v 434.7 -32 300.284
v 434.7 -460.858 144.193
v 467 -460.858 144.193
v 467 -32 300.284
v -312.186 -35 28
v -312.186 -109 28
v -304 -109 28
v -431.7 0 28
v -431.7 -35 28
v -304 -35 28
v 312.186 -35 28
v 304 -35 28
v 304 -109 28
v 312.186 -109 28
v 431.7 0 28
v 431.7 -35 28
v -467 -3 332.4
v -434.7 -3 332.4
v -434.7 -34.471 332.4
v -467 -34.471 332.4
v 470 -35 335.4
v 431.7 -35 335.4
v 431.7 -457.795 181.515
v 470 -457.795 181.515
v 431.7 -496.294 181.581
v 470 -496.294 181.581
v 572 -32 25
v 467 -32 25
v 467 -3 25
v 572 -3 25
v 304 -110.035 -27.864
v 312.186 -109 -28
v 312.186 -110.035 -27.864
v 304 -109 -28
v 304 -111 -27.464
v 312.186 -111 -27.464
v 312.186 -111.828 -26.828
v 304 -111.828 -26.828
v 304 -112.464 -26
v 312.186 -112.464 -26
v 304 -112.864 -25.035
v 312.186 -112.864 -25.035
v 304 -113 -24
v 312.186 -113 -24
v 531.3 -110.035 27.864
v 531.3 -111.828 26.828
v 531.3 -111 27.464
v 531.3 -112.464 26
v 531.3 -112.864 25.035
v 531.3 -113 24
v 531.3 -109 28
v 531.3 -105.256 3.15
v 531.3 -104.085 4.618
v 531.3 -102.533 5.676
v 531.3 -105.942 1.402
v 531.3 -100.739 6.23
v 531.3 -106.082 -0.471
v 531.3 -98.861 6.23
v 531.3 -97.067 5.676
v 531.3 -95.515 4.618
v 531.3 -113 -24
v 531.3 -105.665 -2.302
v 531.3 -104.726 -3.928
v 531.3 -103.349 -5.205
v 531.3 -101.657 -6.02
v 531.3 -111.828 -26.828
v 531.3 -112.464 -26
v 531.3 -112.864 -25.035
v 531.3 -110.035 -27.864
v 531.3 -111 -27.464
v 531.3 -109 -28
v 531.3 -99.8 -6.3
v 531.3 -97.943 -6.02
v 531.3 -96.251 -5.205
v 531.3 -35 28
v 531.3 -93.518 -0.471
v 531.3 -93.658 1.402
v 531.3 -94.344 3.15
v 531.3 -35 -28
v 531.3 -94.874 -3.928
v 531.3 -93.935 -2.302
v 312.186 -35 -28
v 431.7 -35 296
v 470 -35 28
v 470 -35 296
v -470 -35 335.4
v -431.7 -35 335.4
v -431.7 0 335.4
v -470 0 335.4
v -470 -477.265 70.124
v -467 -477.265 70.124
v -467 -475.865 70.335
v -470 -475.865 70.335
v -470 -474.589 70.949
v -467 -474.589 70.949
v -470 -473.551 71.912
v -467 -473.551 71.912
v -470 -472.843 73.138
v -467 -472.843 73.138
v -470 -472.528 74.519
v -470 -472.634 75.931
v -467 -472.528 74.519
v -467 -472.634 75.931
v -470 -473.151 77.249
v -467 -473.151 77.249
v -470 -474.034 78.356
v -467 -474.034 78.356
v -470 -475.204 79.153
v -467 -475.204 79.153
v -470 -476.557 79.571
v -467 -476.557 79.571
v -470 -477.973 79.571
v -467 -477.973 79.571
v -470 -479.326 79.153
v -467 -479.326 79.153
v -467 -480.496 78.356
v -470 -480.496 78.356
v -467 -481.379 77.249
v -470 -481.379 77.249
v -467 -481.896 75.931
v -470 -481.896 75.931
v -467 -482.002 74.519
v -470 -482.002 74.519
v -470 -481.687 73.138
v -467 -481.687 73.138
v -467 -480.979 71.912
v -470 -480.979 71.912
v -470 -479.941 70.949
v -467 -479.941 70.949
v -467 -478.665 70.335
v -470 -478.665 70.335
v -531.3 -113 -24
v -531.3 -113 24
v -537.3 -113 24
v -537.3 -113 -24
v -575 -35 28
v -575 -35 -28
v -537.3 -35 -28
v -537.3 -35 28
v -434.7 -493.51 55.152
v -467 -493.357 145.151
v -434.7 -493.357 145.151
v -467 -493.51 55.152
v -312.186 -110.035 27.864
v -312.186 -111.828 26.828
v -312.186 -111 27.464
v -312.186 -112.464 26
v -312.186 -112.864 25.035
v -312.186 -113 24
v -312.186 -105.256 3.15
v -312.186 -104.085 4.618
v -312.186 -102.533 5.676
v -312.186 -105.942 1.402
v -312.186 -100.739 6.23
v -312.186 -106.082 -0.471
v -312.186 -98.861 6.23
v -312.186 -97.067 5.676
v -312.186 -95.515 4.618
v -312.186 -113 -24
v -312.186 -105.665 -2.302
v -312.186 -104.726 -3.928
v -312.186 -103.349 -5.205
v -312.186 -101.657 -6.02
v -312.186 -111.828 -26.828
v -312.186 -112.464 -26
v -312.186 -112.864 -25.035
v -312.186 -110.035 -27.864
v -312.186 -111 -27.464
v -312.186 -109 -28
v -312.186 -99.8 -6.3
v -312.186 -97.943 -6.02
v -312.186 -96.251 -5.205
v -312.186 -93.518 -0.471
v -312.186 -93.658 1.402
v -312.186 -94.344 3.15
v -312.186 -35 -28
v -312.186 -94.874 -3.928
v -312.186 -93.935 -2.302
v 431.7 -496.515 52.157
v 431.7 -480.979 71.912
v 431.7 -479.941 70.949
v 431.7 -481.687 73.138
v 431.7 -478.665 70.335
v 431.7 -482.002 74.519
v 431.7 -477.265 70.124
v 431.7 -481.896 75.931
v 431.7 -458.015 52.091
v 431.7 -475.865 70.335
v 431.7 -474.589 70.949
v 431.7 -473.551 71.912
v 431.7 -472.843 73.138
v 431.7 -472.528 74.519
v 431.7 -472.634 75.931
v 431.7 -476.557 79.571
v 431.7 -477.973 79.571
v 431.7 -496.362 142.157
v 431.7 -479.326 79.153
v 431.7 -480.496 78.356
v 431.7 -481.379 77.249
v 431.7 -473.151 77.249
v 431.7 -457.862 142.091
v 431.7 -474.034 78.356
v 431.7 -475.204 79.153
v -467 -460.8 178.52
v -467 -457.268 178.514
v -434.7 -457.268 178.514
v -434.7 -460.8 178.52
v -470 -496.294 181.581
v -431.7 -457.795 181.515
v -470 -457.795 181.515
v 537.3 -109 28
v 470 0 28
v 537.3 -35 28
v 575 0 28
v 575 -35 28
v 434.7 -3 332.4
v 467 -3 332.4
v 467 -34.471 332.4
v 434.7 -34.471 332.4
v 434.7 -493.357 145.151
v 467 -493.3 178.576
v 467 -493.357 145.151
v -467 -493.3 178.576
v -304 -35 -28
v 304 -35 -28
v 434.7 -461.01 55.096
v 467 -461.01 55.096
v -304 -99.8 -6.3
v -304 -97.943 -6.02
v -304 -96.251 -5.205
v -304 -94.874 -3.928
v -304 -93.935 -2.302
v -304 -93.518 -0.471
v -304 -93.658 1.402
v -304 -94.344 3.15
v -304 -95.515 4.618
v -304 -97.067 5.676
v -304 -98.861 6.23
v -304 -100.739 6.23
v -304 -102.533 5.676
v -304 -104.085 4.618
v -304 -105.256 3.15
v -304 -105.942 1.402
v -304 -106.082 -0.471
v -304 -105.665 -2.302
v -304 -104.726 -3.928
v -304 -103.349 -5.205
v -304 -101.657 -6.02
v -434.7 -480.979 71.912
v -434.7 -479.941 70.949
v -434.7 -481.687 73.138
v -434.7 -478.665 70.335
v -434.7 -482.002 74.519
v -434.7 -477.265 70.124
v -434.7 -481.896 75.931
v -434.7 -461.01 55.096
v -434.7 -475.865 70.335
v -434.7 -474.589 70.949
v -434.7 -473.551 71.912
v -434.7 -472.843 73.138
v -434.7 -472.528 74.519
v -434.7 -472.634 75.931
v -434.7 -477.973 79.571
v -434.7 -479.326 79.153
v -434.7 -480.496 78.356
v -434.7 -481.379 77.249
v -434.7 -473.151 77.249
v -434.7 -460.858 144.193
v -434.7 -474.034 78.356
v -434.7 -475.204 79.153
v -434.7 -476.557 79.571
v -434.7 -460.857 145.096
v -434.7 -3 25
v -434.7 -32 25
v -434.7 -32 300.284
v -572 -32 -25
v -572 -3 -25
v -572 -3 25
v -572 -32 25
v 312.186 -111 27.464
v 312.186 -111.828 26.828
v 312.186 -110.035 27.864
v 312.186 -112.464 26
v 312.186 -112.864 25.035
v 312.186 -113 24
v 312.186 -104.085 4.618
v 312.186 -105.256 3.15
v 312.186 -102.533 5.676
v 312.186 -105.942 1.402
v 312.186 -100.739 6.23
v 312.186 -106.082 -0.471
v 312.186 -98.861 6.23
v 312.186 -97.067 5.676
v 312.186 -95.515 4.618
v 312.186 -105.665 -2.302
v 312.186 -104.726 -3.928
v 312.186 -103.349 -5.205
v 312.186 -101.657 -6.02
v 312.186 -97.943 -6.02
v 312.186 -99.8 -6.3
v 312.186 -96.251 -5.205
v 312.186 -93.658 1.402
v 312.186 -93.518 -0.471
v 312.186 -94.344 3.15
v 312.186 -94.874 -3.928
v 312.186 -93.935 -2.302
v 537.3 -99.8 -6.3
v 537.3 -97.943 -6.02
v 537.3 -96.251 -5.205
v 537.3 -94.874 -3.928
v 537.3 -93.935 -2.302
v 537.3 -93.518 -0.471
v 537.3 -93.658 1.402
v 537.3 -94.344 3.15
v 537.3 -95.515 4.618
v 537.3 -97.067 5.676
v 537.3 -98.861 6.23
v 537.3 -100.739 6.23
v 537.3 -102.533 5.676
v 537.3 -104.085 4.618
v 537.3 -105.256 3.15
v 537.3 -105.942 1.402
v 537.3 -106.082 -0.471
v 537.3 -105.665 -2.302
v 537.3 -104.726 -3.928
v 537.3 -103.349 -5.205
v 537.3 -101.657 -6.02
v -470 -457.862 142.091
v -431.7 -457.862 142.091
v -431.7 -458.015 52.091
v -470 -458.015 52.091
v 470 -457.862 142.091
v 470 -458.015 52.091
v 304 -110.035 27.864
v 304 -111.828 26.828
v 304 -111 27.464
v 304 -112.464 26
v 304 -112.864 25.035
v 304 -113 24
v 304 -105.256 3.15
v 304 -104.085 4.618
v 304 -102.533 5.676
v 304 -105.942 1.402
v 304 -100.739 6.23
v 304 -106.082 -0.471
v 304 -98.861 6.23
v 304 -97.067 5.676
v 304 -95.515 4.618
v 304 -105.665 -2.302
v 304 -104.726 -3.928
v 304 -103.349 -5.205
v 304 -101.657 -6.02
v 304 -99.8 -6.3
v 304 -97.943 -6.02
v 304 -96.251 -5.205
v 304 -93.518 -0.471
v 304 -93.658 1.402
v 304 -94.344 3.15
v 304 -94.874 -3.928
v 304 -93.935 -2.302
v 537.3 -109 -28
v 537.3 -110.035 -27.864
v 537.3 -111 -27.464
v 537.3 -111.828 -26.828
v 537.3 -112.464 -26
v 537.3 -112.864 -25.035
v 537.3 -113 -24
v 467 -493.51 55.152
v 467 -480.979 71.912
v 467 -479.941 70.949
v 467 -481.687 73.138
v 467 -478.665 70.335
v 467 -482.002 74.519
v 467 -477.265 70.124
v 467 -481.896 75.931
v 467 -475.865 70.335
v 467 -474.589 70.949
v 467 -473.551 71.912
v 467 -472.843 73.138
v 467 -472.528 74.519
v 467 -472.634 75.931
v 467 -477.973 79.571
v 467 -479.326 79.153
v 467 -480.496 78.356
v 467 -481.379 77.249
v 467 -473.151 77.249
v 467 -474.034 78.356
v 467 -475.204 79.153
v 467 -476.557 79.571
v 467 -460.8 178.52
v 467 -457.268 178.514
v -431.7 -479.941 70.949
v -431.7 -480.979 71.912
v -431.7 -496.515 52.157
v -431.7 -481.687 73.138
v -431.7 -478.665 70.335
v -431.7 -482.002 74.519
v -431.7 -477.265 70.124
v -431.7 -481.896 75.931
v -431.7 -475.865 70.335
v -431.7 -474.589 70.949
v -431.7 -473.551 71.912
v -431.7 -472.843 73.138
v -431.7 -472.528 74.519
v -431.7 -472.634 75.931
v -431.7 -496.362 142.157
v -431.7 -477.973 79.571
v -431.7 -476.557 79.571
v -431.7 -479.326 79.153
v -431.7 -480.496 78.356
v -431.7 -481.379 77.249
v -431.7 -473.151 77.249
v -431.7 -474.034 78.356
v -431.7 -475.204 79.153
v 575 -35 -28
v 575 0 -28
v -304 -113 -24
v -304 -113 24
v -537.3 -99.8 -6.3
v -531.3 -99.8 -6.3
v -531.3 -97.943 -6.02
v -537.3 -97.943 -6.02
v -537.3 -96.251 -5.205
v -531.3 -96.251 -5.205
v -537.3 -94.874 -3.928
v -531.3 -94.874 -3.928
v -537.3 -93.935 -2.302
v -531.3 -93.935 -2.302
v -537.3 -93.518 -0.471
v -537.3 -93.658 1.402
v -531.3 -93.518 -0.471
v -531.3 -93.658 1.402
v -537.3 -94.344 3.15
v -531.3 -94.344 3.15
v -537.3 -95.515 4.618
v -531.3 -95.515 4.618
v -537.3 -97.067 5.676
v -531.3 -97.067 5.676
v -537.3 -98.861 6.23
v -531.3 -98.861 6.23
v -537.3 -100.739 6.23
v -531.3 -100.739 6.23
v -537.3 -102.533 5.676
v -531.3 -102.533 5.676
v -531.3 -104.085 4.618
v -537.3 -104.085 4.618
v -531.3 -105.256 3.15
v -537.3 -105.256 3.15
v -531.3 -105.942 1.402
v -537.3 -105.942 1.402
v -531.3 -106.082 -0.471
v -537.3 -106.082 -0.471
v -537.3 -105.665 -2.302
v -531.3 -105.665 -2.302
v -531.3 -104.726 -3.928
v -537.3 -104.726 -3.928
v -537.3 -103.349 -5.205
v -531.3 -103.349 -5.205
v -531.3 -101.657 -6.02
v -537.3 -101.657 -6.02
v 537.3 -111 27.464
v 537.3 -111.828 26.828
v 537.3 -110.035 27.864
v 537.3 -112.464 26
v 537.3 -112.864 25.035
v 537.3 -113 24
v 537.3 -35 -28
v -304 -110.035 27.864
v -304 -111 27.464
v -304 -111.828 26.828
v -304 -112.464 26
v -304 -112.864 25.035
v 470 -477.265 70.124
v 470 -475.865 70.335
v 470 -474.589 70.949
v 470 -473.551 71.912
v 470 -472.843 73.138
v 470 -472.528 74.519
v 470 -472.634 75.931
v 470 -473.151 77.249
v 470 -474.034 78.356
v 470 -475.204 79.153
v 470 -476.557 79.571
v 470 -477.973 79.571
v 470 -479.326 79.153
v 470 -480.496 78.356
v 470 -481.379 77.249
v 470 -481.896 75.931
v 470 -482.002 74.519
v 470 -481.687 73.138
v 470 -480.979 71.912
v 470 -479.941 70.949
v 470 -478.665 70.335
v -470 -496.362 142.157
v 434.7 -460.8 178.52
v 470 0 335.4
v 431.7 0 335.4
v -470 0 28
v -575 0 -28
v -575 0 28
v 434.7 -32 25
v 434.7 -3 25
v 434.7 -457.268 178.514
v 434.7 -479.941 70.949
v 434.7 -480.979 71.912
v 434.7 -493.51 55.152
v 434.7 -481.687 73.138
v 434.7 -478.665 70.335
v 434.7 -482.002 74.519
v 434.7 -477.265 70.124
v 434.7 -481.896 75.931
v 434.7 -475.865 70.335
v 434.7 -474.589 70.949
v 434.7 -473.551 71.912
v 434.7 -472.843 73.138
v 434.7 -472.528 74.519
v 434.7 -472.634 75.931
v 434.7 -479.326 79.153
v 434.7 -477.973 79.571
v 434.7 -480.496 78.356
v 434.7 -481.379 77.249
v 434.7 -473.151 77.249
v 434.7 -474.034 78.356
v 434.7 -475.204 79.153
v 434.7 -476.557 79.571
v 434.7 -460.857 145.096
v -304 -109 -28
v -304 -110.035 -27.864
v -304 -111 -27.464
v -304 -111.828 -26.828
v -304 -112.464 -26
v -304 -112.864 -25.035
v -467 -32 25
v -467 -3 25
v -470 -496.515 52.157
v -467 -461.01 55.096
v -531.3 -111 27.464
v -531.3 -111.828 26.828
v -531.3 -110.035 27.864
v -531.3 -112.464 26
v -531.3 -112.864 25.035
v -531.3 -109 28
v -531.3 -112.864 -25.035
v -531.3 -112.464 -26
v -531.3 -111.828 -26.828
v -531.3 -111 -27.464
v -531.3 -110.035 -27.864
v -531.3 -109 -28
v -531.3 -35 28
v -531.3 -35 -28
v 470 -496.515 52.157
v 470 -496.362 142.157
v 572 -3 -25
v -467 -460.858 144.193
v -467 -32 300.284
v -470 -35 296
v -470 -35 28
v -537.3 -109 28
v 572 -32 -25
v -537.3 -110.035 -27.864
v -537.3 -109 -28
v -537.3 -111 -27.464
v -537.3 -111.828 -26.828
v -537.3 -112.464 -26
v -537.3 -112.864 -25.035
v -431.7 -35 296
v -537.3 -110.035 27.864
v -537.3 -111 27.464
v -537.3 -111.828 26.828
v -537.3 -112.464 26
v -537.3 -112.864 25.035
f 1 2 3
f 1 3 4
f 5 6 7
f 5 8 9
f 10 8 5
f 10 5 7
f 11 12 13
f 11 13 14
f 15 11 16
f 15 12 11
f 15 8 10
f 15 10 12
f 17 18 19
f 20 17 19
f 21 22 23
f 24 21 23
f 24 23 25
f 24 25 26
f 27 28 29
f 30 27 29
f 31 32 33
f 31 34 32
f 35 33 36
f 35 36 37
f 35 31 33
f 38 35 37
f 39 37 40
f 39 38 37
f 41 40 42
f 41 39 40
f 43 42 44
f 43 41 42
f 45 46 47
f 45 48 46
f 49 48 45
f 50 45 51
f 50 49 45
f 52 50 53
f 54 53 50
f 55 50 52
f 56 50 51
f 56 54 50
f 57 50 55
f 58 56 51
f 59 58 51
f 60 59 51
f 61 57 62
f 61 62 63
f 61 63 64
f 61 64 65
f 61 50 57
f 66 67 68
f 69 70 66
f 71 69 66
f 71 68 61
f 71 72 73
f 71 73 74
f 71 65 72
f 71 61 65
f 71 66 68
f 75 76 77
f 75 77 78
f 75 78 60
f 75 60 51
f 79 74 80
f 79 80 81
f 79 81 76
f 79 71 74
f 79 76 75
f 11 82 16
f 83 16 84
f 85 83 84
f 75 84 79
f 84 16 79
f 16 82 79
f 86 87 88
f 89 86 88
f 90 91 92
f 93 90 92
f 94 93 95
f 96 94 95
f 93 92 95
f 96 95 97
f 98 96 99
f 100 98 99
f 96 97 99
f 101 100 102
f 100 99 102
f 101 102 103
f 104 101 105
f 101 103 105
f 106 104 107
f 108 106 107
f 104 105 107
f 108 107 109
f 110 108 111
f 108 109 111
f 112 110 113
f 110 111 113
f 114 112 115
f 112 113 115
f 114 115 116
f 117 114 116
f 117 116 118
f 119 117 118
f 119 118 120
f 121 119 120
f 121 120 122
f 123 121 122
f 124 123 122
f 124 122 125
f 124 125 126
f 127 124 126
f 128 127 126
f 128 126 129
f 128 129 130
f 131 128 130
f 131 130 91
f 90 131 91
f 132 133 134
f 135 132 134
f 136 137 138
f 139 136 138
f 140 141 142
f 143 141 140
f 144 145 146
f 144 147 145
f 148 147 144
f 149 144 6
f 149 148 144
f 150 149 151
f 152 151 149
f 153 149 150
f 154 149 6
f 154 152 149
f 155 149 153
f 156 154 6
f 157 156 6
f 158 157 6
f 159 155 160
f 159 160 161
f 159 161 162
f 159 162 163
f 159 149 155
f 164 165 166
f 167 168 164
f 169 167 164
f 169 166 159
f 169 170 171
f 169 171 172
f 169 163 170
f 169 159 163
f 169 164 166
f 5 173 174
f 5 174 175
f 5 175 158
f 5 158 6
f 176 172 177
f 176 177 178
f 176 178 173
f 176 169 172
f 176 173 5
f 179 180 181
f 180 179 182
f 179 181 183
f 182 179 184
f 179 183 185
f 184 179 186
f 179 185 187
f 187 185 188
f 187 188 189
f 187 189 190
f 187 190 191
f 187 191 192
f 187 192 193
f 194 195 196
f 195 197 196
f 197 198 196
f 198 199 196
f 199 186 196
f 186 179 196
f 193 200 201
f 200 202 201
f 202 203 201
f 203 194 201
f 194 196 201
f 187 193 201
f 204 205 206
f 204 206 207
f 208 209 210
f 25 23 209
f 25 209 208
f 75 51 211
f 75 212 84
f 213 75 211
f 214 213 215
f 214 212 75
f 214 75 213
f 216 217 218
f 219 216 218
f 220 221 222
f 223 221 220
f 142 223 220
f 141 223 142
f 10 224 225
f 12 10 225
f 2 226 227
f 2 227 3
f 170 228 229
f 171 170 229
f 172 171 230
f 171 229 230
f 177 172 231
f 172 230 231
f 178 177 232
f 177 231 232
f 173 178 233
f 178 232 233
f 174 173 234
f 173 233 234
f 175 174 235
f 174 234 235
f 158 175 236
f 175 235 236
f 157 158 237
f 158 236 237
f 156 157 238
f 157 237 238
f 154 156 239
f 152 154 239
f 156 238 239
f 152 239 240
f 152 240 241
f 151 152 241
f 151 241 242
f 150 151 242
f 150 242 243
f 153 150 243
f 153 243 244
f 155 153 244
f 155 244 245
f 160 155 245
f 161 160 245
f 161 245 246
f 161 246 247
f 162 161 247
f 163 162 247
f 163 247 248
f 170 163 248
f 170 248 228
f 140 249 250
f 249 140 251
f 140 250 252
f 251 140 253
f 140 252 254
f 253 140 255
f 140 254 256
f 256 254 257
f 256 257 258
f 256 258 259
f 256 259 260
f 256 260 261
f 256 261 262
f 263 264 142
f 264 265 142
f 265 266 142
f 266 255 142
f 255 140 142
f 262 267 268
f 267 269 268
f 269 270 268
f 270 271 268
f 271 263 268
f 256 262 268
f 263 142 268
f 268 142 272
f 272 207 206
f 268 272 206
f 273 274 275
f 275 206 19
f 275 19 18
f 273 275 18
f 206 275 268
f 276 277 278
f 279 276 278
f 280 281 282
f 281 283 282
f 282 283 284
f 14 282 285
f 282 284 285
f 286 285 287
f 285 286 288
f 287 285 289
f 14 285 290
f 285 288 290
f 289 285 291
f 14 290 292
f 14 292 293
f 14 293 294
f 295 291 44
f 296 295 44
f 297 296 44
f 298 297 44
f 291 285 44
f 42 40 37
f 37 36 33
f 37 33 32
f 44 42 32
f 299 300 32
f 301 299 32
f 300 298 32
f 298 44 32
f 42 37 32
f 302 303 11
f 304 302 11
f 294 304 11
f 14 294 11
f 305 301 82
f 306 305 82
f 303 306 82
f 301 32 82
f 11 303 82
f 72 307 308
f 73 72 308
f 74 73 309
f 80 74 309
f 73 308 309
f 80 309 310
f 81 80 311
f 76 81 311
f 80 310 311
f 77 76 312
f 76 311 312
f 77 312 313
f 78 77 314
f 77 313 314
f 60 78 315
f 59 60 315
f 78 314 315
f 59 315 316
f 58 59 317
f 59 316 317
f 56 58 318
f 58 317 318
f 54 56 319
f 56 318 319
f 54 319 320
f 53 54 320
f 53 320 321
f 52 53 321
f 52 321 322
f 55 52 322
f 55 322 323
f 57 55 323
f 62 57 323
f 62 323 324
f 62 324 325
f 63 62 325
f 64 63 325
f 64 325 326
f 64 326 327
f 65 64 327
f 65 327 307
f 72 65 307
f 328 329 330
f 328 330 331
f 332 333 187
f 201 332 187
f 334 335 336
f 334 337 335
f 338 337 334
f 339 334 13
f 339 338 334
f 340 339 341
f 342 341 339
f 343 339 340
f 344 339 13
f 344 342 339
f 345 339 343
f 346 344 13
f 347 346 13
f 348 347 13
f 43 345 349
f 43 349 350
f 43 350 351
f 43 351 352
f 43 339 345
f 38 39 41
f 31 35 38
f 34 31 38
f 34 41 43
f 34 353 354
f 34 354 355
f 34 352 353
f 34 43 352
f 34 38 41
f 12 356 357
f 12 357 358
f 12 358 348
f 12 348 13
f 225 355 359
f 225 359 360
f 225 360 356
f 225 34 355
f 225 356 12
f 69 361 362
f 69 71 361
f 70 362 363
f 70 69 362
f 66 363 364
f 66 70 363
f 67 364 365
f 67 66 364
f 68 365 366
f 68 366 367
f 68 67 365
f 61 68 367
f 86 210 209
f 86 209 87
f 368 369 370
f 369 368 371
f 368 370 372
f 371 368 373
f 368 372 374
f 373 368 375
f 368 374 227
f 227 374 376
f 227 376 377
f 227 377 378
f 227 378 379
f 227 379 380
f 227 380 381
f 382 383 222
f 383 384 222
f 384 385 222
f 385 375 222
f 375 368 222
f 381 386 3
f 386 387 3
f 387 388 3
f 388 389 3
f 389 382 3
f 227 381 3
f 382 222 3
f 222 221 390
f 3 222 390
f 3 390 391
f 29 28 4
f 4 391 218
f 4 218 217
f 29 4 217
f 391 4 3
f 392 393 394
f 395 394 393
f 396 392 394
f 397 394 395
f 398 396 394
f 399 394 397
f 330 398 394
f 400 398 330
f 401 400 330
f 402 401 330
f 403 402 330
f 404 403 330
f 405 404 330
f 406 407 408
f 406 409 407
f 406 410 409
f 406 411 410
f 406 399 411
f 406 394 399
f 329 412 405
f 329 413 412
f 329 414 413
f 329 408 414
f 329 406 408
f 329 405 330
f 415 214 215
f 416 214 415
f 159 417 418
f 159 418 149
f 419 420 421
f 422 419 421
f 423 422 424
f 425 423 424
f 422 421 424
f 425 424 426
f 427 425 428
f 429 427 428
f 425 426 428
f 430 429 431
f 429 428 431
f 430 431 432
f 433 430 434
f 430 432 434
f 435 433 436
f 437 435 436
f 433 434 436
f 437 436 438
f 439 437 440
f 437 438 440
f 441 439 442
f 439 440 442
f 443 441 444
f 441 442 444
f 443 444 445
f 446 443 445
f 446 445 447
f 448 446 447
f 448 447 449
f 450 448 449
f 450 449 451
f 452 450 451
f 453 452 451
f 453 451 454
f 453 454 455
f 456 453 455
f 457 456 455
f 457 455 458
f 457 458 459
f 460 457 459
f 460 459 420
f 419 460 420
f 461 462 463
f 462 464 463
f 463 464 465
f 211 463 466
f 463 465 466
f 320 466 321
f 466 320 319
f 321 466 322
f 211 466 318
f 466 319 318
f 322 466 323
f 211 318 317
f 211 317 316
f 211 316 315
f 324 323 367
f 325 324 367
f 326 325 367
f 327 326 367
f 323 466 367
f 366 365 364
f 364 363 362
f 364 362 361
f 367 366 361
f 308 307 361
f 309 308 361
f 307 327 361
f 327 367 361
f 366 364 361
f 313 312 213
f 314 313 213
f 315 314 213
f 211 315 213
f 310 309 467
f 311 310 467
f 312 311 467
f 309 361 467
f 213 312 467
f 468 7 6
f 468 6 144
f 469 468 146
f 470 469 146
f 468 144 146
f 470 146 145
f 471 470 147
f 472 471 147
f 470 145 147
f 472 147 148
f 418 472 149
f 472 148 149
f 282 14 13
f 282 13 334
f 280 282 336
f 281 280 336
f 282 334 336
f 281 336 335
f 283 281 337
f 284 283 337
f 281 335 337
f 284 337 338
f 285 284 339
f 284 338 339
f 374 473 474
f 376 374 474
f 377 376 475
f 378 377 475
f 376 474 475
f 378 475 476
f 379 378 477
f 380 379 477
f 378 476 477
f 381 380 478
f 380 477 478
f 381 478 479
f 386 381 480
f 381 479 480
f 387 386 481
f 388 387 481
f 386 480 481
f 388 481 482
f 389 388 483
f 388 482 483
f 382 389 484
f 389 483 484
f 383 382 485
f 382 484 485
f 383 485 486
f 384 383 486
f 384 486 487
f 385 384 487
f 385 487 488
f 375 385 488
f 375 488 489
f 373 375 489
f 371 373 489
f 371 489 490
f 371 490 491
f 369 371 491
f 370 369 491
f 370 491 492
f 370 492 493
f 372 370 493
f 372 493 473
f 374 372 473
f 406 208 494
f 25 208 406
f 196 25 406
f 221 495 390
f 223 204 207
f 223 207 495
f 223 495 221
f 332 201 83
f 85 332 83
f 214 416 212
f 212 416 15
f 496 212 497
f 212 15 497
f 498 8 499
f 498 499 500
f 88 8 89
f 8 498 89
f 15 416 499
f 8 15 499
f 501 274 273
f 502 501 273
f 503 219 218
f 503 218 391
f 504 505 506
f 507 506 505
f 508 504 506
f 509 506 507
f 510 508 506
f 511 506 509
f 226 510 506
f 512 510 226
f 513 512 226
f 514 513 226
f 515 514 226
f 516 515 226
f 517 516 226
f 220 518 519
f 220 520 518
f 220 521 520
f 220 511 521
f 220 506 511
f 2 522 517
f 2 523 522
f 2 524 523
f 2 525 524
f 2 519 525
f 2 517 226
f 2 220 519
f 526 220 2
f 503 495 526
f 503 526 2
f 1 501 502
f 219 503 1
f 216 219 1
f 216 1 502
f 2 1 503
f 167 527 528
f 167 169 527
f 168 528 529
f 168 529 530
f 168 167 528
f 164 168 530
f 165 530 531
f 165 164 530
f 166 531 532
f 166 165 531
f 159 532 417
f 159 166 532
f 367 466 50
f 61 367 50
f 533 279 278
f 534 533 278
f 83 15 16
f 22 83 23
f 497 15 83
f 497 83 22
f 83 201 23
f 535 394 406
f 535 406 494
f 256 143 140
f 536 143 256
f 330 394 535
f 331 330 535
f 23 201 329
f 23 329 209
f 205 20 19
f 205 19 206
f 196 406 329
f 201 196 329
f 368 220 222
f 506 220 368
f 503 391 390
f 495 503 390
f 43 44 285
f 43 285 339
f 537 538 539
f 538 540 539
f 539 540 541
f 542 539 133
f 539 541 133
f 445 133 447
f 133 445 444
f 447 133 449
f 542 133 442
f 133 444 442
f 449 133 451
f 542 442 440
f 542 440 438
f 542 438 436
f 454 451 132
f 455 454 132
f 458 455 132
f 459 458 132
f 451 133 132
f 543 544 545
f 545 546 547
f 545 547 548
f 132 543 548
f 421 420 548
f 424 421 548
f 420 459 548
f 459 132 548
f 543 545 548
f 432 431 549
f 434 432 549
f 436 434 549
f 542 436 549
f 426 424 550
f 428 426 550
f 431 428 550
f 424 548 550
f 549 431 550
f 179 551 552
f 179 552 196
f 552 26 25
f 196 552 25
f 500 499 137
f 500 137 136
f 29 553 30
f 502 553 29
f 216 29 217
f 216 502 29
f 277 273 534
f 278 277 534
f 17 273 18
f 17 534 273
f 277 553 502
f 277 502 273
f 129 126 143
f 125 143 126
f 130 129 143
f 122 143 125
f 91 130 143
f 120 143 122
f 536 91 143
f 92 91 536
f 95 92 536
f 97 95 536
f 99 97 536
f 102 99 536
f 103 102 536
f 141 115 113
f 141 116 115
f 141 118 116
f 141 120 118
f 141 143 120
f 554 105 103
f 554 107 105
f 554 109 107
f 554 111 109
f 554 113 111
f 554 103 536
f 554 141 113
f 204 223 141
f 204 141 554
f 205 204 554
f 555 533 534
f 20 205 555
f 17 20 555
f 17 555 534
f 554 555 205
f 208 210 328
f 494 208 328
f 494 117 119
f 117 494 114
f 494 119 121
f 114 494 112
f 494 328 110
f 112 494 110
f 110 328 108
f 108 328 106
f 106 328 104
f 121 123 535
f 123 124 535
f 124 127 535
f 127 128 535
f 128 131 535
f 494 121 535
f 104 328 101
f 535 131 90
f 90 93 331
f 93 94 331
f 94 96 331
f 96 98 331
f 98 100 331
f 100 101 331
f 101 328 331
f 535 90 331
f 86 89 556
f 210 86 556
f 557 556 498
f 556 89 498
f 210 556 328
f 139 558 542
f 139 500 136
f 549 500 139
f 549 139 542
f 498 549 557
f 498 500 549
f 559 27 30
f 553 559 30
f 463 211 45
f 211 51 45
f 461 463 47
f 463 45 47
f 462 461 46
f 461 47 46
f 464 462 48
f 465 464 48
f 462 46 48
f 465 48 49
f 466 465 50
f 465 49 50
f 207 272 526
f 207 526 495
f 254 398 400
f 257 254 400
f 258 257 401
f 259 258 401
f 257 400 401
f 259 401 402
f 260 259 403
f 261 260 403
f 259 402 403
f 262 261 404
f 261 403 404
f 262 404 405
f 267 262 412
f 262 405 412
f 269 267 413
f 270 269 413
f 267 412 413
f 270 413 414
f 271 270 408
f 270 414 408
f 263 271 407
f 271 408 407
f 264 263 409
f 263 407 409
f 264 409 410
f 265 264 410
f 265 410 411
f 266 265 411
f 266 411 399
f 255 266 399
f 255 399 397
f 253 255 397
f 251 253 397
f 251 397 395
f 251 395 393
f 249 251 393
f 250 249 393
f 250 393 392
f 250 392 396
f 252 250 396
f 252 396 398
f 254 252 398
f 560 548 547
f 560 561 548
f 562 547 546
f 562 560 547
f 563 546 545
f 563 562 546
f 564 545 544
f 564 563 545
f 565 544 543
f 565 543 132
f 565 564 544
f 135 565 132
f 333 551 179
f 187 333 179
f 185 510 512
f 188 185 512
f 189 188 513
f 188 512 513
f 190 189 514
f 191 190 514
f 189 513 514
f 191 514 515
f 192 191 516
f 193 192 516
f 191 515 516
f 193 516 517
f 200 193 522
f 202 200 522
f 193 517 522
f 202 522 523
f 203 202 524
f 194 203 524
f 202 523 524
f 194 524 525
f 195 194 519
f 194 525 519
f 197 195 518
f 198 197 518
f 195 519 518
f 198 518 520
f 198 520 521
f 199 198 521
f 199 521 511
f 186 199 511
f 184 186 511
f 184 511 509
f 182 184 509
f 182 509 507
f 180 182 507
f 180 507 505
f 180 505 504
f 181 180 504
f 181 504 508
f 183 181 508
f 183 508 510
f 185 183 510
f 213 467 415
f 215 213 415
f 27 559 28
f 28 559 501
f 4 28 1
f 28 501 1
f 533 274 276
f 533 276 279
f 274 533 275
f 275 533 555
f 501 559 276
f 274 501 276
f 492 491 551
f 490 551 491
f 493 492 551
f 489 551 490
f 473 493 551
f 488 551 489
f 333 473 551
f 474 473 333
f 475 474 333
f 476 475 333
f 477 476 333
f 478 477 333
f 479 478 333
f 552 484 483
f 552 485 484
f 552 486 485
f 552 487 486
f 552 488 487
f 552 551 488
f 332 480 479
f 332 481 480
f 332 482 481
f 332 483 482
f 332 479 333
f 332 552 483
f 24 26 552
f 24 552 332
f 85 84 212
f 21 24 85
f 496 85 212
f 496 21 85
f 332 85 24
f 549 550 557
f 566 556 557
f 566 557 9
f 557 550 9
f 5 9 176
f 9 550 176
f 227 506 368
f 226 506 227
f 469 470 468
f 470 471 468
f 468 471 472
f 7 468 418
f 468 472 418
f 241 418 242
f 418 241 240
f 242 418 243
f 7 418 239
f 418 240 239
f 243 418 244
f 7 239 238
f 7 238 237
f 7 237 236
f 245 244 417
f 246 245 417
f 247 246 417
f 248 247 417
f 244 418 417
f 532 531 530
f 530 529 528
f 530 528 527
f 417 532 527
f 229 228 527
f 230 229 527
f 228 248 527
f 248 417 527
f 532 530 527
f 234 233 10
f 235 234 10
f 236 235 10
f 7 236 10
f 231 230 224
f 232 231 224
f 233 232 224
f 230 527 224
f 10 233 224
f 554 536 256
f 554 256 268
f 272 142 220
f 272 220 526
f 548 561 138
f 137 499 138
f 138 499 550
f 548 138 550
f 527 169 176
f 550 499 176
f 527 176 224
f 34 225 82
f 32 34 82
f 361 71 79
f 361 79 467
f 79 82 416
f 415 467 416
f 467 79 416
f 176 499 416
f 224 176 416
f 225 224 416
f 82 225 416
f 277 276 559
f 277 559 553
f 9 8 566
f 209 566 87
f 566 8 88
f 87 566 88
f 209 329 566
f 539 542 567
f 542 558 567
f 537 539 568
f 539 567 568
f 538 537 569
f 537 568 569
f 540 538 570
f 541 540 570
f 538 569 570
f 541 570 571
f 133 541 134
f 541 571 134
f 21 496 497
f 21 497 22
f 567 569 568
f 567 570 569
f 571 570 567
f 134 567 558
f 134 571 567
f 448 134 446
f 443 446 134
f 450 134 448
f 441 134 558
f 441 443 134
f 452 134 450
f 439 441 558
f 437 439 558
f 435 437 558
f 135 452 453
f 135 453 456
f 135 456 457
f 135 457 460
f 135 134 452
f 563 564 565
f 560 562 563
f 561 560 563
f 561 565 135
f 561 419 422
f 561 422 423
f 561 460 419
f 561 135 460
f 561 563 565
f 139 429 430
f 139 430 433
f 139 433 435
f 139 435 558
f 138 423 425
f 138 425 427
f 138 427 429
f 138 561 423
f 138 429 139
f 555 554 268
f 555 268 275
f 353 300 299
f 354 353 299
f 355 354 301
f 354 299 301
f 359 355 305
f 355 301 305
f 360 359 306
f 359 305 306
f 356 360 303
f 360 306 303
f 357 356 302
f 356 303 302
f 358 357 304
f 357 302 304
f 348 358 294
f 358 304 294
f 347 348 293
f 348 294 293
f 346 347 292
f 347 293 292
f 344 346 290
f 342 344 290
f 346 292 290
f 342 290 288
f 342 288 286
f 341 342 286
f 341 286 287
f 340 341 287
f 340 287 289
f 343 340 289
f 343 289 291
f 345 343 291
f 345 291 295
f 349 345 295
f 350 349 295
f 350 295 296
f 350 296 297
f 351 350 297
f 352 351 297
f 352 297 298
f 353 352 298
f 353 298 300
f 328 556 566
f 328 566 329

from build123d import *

# Parameters (mm, degrees)
SKETCH1_W            = 1150
SKETCH1_H            = 56
BOSS_EXTRUDE1_DEPTH  = 35
SKETCH2_W            = 38.3
SKETCH2_H            = 35
BOSS_EXTRUDE2_DEPTH  = 268
BOSS_EXTRUDE3_DEPTH  = 38.3
BOSS_EXTRUDE4_DEPTH  = 38.3
SKETCH5_W            = 38.3
SKETCH5_H            = 39.42449842
BOSS_EXTRUDE5_DEPTH  = 38.5
BOSS_EXTRUDE6_DEPTH  = 901.7
SKETCH8_W            = 38.3
SKETCH8_H            = 38.5
BOSS_EXTRUDE7_DEPTH  = 90
SHELL2_START         = -467
SHELL2_OUTLINE_W     = 29
SHELL2_OUTLINE_H     = 50
SHELL2_DEPTH         = 934
SHELL2_2_DEPTH       = 32.3
SHELL2_START_2       = 434.7
SHELL2_3_DEPTH       = 32.3
SHELL2_START_3       = -575
SHELL2_4_OUTLINE_W   = 29
SHELL2_4_OUTLINE_H   = 50
SHELL2_4_DEPTH       = 1147
SKETCH13_W           = 50
SKETCH13_H           = 29
BOSS_EXTRUDE8_DEPTH  = 3
SKETCH14_R           = 4.75
CUT_EXTRUDE1_DEPTH   = 1390
SKETCH15_W           = 8.185813993
SKETCH15_H           = 78
SKETCH15_W_2         = 6
BOSS_EXTRUDE10_DEPTH = 56
FILLET2_R            = 4
SKETCH16_R           = 6.3
CUT_EXTRUDE2_DEPTH   = 1390


# Read off the part's stored shape, not the designer's step: Shell2
with BuildPart() as part:
    # Sketch1 → Boss-Extrude1 (new body)
    with BuildSketch(Plane(origin=(0, 0, 0), x_dir=(1, 0, 0), z_dir=(0, 1, 0))):
        Rectangle(SKETCH1_W, SKETCH1_H)
    extrude(amount=-BOSS_EXTRUDE1_DEPTH)

    # Sketch2 → Boss-Extrude2 (add)
    with BuildSketch(Plane.XY.offset(28)):
        with Locations((-450.85, -17.5)):
            Rectangle(SKETCH2_W, SKETCH2_H)
        with Locations((450.85, -17.5)):
            Rectangle(SKETCH2_W, SKETCH2_H)
    extrude(amount=BOSS_EXTRUDE2_DEPTH)

    # Sketch3 → Boss-Extrude3 (add)
    with BuildSketch(Plane.ZY.offset(470)):
        Polygon((296, -35), (142.090935503, -457.861679354), (181.515376734, -457.794527623), (335.4, -35), (335.4, 0), (296, 0), align=None)
    extrude(amount=-BOSS_EXTRUDE3_DEPTH)

    # Sketch4 → Boss-Extrude4 (add)
    with BuildSketch(Plane.ZY.offset(-431.7)):
        Polygon((296, 0), (335.4, 0), (335.4, -35), (181.515376734, -457.794527623), (142.090935503, -457.861679354), (296, -35), align=None)
    extrude(amount=-BOSS_EXTRUDE4_DEPTH)

    # Sketch5 → Boss-Extrude5 (add)
    with BuildSketch(Plane(origin=(0, -458.102374067, 0.780286699), x_dir=(1, 0, 0), z_dir=(0, -0.9999985493842727, 0.0017032995480483616))):
        with Locations((450.85, 161.023103003)):
            Rectangle(SKETCH5_W, SKETCH5_H)
    extrude(amount=BOSS_EXTRUDE5_DEPTH)

    # Sketch6 → Boss-Extrude6 (add)
    with BuildSketch(Plane.ZY.offset(-431.7)):
        Polygon((142.090935503, -457.861679354), (181.515376734, -457.794527623), (181.580953767, -496.294471775), (142.156512536, -496.361623505), align=None)
    extrude(amount=BOSS_EXTRUDE6_DEPTH)

    # Sketch8 → Boss-Extrude7 (add)
    with BuildSketch(Plane(origin=(0, 0.240694713, 141.310648805), x_dir=(-1, 0, 0), z_dir=(0, -0.0017032995480483616, -0.9999985493842727))):
        with Locations((-450.85, -477.353038599)):
            Rectangle(SKETCH8_W, SKETCH8_H)
        with Locations((450.85, -477.353038599)):
            Rectangle(SKETCH8_W, SKETCH8_H)
    extrude(amount=BOSS_EXTRUDE7_DEPTH)

    # Shell2 outline → Shell2 (cut)
    with BuildSketch(Plane.YZ.offset(SHELL2_START)):
        Polygon((-493.356517958, 145.151398286), (-460.856565103, 145.09604105), (-460.79963317, 178.520490985), (-493.299586025, 178.57584822), align=None)
        with Locations((-17.5, 0)):
            Rectangle(SHELL2_OUTLINE_W, SHELL2_OUTLINE_H)
    extrude(amount=SHELL2_DEPTH, mode=Mode.SUBTRACT)

    # Shell2 2 outline → Shell2 2 (cut)
    with BuildSketch(Plane.YZ.offset(SHELL2_START)):
        Polygon((-460.79963317, 178.520490985), (-460.856565103, 145.09604105), (-493.356517958, 145.151398286), (-493.509814917, 55.151528841), (-461.009862062, 55.096171606), (-460.858103494, 144.192859625), (-32, 300.28444402), (-32, 25), (-3, 25), (-3, 332.4), (-34.471019058, 332.4), (-457.268022568, 178.514475585), align=None)
    extrude(amount=SHELL2_2_DEPTH, mode=Mode.SUBTRACT)

    # Shell2 3 outline → Shell2 3 (cut)
    with BuildSketch(Plane.YZ.offset(SHELL2_START_2)):
        Polygon((-460.79963317, 178.520490985), (-460.856565103, 145.09604105), (-493.356517958, 145.151398286), (-493.509814917, 55.151528841), (-461.009862062, 55.096171606), (-460.858103494, 144.192859625), (-32, 300.28444402), (-32, 25), (-3, 25), (-3, 332.4), (-34.471019058, 332.4), (-457.268022568, 178.514475585), align=None)
    extrude(amount=SHELL2_3_DEPTH, mode=Mode.SUBTRACT)

    # Shell2 4 outline → Shell2 4 (cut)
    with BuildSketch(Plane.YZ.offset(SHELL2_START_3)):
        with Locations((-17.5, 0)):
            Rectangle(SHELL2_4_OUTLINE_W, SHELL2_4_OUTLINE_H)
    extrude(amount=SHELL2_4_DEPTH, mode=Mode.SUBTRACT)

    # Sketch13 → Boss-Extrude8 (add)
    with BuildSketch(Plane.ZY.offset(575)):
        with Locations((0, -17.5)):
            Rectangle(SKETCH13_W, SKETCH13_H)
    extrude(amount=-BOSS_EXTRUDE8_DEPTH)

    # Sketch14 → Cut-Extrude1 (cut)
    with BuildSketch(Plane(origin=(470, 0, 0), x_dir=(0, 0, -1), z_dir=(1, 0, 0))):
        with Locations((-74.873854575, -477.264948389)):
            Circle(SKETCH14_R)
    extrude(amount=-CUT_EXTRUDE1_DEPTH, mode=Mode.SUBTRACT)

    # Sketch15 → Boss-Extrude10 (add)
    with BuildSketch(Plane(origin=(0, 0, -28), x_dir=(-1, 0, 0), z_dir=(0, 0, -1))):
        with Locations((308.092906997, -74)):
            Rectangle(SKETCH15_W, SKETCH15_H)
        with Locations((534.3, -74)):
            Rectangle(SKETCH15_W_2, SKETCH15_H)
        with Locations((-534.3, -74)):
            Rectangle(SKETCH15_W_2, SKETCH15_H)
        with Locations((-308.092906997, -74)):
            Rectangle(SKETCH15_W, SKETCH15_H)
    extrude(amount=-BOSS_EXTRUDE10_DEPTH)

    # Fillet2
    fillet2_edges = [part.edges().sort_by_distance(p)[0] for p in [
        (-308.092906997, -113, -28),
        (-308.092906997, -113, 28),
        (-534.3, -113, -28),
        (-534.3, -113, 28),
        (534.3, -113, -28),
        (534.3, -113, 28),
        (308.092906997, -113, -28),
        (308.092906997, -113, 28),
    ]]
    fillet(fillet2_edges, radius=FILLET2_R)

    # Sketch16 → Cut-Extrude2 (cut)
    with BuildSketch(Plane(origin=(537.3, 0, 0), x_dir=(0, 0, -1), z_dir=(1, 0, 0))):
        with Locations((0, -99.8)):
            Circle(SKETCH16_R)
    extrude(amount=-CUT_EXTRUDE2_DEPTH, mode=Mode.SUBTRACT)


solid = part.part
